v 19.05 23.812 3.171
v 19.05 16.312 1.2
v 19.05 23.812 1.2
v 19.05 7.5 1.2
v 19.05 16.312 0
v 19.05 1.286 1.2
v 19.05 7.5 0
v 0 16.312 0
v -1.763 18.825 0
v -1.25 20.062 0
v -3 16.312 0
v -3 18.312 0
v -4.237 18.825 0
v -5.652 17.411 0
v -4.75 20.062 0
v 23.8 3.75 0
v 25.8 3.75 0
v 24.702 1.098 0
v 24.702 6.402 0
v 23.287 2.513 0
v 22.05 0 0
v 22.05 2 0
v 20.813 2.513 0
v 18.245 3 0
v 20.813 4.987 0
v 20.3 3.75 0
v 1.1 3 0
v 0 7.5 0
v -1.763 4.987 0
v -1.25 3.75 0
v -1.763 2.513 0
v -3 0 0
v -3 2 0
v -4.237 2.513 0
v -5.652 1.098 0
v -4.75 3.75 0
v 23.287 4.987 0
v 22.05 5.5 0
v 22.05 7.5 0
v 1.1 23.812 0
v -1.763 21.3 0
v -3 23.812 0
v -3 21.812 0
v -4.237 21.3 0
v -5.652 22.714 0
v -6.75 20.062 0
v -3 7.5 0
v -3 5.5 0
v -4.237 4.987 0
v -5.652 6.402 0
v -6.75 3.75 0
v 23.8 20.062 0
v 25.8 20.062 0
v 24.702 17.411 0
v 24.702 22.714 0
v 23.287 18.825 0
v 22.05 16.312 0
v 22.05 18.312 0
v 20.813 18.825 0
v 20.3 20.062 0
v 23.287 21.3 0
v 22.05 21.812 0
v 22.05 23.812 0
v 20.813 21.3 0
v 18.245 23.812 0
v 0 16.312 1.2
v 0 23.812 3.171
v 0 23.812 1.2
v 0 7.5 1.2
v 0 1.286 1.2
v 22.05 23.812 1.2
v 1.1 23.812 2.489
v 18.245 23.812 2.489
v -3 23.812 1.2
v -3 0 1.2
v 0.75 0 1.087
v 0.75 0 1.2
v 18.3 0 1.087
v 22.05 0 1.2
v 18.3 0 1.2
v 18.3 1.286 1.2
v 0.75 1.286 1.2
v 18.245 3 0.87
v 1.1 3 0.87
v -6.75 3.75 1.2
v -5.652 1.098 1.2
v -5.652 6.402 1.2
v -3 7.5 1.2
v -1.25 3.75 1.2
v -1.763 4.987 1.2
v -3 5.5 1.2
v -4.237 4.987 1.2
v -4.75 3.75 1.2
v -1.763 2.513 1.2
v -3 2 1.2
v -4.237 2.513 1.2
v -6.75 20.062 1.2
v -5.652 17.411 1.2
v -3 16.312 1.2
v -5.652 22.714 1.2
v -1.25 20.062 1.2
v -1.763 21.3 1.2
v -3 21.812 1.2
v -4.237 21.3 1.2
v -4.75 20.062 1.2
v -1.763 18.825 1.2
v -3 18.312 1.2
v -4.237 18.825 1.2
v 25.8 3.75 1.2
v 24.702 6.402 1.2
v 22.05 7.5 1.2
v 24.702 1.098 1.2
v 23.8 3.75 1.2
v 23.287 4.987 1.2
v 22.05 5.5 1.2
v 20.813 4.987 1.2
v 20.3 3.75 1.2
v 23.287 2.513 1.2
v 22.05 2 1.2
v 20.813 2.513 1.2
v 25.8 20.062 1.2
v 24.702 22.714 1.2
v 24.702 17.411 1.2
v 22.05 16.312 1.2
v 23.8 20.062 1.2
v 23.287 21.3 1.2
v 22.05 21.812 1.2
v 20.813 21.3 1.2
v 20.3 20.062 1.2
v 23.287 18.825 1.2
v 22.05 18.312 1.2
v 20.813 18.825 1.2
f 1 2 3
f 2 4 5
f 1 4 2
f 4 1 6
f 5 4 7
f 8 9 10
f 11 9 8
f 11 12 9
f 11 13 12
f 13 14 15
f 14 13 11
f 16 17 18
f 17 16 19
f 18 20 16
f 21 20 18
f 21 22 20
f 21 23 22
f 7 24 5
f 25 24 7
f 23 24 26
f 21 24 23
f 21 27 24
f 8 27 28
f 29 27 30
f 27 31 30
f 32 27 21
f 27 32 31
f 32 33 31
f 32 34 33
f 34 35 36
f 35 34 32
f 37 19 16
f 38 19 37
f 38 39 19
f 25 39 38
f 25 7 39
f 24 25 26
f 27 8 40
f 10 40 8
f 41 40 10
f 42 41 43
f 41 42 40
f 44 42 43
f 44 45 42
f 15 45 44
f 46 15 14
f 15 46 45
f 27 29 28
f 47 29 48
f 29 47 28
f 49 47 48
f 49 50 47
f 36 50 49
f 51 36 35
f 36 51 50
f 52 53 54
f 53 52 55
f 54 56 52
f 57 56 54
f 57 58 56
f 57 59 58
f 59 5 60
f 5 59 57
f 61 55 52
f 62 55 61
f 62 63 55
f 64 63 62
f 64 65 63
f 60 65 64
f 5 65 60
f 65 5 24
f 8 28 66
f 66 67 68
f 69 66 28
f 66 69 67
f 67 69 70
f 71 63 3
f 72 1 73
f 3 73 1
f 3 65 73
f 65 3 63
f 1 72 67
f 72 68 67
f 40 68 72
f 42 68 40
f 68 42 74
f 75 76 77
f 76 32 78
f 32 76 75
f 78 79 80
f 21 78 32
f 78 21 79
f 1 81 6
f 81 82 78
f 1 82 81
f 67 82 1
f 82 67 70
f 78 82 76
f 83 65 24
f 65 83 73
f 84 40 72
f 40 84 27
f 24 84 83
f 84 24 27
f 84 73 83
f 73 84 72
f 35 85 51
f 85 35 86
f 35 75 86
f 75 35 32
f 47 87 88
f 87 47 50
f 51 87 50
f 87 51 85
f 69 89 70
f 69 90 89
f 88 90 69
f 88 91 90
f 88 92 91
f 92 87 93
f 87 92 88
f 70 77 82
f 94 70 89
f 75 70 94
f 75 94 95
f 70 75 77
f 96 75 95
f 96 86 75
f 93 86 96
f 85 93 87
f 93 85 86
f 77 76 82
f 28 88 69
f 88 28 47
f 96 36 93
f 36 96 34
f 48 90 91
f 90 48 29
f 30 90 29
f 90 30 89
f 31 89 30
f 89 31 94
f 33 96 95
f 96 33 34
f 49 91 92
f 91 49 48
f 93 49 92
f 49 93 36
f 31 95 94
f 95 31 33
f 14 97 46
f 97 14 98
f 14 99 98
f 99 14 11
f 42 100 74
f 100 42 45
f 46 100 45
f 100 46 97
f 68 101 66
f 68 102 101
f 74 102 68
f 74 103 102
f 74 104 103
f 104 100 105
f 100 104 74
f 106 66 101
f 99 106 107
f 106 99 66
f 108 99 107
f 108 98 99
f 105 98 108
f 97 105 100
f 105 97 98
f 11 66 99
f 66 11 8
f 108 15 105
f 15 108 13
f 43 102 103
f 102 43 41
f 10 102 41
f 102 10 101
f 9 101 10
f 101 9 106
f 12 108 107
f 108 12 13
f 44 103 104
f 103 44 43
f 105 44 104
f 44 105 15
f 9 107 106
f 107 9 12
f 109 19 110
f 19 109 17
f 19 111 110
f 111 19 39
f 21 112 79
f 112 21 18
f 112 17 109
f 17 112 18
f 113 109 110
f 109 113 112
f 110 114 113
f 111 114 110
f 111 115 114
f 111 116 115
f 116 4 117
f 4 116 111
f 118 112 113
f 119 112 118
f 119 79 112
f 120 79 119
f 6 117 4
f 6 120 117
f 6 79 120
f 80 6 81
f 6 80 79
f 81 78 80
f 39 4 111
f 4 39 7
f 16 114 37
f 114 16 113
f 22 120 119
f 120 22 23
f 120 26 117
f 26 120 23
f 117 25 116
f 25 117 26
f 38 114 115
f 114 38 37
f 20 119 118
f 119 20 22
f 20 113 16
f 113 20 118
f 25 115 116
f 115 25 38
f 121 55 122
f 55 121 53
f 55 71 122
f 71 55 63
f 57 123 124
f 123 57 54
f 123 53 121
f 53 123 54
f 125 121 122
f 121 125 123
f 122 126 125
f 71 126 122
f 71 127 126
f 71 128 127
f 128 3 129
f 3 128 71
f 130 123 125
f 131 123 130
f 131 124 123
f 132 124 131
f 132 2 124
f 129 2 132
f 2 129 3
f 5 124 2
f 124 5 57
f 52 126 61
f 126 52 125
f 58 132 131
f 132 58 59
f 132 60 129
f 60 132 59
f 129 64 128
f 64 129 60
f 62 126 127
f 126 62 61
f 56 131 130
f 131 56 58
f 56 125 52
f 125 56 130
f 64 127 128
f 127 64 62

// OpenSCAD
FF = 0.1;
key_unit_size = 19.05;

thickness = 1.2;

x_unit_width = 1;
y_unit_length = 1.25;

hole_x_offset = 3;
hole_y_offset = 2;
hole_d = 3.5;
  /*[-3, 2],
  [width+3, 2],
  [-3, length-2],
  [width+3, length-2],
].each do |hole_x, hole_y|
  translate(v: [hole_x,hole_y,0]) do
    cylinder(d:3, h: case_floor_thickness+(FF*2),fn: 6)
  end
end*/

screw_tab_outer = hole_d+4;

module screw_tab() {

  difference() {
    union() {
      cylinder(d=screw_tab_outer, h=thickness, $fn=8);
      translate([0,-screw_tab_outer/2, 0])  cube([screw_tab_outer/2, screw_tab_outer, thickness]);
    }
    translate([0,0,-FF]) cylinder(d=hole_d, h=thickness+FF*2, $fn=8);
  }


}

module ramp() {
  difference() {
    cube([x_unit_width*key_unit_size, y_unit_length*key_unit_size, thickness*5]);
    translate([0,-1,1]) rotate([5,0,0]) cube([x_unit_width*key_unit_size, (y_unit_length*key_unit_size)*1.5, thickness*5]);
  }
}

difference(){
  ramp();
  translate([1.1,3,0])scale([0.9,0.9,0.8]) ramp();
}

translate([-hole_x_offset,hole_y_offset+(hole_d/2),0]) {
  screw_tab();
  translate([0,(y_unit_length*key_unit_size)-screw_tab_outer,0]) screw_tab();
}

translate([(x_unit_width*key_unit_size)+hole_x_offset,hole_y_offset+(hole_d/2),0]) {
  rotate([0,0,180]) screw_tab();
  translate([0,(y_unit_length*key_unit_size)-screw_tab_outer,0]) rotate([0,0,180]) screw_tab();
}
